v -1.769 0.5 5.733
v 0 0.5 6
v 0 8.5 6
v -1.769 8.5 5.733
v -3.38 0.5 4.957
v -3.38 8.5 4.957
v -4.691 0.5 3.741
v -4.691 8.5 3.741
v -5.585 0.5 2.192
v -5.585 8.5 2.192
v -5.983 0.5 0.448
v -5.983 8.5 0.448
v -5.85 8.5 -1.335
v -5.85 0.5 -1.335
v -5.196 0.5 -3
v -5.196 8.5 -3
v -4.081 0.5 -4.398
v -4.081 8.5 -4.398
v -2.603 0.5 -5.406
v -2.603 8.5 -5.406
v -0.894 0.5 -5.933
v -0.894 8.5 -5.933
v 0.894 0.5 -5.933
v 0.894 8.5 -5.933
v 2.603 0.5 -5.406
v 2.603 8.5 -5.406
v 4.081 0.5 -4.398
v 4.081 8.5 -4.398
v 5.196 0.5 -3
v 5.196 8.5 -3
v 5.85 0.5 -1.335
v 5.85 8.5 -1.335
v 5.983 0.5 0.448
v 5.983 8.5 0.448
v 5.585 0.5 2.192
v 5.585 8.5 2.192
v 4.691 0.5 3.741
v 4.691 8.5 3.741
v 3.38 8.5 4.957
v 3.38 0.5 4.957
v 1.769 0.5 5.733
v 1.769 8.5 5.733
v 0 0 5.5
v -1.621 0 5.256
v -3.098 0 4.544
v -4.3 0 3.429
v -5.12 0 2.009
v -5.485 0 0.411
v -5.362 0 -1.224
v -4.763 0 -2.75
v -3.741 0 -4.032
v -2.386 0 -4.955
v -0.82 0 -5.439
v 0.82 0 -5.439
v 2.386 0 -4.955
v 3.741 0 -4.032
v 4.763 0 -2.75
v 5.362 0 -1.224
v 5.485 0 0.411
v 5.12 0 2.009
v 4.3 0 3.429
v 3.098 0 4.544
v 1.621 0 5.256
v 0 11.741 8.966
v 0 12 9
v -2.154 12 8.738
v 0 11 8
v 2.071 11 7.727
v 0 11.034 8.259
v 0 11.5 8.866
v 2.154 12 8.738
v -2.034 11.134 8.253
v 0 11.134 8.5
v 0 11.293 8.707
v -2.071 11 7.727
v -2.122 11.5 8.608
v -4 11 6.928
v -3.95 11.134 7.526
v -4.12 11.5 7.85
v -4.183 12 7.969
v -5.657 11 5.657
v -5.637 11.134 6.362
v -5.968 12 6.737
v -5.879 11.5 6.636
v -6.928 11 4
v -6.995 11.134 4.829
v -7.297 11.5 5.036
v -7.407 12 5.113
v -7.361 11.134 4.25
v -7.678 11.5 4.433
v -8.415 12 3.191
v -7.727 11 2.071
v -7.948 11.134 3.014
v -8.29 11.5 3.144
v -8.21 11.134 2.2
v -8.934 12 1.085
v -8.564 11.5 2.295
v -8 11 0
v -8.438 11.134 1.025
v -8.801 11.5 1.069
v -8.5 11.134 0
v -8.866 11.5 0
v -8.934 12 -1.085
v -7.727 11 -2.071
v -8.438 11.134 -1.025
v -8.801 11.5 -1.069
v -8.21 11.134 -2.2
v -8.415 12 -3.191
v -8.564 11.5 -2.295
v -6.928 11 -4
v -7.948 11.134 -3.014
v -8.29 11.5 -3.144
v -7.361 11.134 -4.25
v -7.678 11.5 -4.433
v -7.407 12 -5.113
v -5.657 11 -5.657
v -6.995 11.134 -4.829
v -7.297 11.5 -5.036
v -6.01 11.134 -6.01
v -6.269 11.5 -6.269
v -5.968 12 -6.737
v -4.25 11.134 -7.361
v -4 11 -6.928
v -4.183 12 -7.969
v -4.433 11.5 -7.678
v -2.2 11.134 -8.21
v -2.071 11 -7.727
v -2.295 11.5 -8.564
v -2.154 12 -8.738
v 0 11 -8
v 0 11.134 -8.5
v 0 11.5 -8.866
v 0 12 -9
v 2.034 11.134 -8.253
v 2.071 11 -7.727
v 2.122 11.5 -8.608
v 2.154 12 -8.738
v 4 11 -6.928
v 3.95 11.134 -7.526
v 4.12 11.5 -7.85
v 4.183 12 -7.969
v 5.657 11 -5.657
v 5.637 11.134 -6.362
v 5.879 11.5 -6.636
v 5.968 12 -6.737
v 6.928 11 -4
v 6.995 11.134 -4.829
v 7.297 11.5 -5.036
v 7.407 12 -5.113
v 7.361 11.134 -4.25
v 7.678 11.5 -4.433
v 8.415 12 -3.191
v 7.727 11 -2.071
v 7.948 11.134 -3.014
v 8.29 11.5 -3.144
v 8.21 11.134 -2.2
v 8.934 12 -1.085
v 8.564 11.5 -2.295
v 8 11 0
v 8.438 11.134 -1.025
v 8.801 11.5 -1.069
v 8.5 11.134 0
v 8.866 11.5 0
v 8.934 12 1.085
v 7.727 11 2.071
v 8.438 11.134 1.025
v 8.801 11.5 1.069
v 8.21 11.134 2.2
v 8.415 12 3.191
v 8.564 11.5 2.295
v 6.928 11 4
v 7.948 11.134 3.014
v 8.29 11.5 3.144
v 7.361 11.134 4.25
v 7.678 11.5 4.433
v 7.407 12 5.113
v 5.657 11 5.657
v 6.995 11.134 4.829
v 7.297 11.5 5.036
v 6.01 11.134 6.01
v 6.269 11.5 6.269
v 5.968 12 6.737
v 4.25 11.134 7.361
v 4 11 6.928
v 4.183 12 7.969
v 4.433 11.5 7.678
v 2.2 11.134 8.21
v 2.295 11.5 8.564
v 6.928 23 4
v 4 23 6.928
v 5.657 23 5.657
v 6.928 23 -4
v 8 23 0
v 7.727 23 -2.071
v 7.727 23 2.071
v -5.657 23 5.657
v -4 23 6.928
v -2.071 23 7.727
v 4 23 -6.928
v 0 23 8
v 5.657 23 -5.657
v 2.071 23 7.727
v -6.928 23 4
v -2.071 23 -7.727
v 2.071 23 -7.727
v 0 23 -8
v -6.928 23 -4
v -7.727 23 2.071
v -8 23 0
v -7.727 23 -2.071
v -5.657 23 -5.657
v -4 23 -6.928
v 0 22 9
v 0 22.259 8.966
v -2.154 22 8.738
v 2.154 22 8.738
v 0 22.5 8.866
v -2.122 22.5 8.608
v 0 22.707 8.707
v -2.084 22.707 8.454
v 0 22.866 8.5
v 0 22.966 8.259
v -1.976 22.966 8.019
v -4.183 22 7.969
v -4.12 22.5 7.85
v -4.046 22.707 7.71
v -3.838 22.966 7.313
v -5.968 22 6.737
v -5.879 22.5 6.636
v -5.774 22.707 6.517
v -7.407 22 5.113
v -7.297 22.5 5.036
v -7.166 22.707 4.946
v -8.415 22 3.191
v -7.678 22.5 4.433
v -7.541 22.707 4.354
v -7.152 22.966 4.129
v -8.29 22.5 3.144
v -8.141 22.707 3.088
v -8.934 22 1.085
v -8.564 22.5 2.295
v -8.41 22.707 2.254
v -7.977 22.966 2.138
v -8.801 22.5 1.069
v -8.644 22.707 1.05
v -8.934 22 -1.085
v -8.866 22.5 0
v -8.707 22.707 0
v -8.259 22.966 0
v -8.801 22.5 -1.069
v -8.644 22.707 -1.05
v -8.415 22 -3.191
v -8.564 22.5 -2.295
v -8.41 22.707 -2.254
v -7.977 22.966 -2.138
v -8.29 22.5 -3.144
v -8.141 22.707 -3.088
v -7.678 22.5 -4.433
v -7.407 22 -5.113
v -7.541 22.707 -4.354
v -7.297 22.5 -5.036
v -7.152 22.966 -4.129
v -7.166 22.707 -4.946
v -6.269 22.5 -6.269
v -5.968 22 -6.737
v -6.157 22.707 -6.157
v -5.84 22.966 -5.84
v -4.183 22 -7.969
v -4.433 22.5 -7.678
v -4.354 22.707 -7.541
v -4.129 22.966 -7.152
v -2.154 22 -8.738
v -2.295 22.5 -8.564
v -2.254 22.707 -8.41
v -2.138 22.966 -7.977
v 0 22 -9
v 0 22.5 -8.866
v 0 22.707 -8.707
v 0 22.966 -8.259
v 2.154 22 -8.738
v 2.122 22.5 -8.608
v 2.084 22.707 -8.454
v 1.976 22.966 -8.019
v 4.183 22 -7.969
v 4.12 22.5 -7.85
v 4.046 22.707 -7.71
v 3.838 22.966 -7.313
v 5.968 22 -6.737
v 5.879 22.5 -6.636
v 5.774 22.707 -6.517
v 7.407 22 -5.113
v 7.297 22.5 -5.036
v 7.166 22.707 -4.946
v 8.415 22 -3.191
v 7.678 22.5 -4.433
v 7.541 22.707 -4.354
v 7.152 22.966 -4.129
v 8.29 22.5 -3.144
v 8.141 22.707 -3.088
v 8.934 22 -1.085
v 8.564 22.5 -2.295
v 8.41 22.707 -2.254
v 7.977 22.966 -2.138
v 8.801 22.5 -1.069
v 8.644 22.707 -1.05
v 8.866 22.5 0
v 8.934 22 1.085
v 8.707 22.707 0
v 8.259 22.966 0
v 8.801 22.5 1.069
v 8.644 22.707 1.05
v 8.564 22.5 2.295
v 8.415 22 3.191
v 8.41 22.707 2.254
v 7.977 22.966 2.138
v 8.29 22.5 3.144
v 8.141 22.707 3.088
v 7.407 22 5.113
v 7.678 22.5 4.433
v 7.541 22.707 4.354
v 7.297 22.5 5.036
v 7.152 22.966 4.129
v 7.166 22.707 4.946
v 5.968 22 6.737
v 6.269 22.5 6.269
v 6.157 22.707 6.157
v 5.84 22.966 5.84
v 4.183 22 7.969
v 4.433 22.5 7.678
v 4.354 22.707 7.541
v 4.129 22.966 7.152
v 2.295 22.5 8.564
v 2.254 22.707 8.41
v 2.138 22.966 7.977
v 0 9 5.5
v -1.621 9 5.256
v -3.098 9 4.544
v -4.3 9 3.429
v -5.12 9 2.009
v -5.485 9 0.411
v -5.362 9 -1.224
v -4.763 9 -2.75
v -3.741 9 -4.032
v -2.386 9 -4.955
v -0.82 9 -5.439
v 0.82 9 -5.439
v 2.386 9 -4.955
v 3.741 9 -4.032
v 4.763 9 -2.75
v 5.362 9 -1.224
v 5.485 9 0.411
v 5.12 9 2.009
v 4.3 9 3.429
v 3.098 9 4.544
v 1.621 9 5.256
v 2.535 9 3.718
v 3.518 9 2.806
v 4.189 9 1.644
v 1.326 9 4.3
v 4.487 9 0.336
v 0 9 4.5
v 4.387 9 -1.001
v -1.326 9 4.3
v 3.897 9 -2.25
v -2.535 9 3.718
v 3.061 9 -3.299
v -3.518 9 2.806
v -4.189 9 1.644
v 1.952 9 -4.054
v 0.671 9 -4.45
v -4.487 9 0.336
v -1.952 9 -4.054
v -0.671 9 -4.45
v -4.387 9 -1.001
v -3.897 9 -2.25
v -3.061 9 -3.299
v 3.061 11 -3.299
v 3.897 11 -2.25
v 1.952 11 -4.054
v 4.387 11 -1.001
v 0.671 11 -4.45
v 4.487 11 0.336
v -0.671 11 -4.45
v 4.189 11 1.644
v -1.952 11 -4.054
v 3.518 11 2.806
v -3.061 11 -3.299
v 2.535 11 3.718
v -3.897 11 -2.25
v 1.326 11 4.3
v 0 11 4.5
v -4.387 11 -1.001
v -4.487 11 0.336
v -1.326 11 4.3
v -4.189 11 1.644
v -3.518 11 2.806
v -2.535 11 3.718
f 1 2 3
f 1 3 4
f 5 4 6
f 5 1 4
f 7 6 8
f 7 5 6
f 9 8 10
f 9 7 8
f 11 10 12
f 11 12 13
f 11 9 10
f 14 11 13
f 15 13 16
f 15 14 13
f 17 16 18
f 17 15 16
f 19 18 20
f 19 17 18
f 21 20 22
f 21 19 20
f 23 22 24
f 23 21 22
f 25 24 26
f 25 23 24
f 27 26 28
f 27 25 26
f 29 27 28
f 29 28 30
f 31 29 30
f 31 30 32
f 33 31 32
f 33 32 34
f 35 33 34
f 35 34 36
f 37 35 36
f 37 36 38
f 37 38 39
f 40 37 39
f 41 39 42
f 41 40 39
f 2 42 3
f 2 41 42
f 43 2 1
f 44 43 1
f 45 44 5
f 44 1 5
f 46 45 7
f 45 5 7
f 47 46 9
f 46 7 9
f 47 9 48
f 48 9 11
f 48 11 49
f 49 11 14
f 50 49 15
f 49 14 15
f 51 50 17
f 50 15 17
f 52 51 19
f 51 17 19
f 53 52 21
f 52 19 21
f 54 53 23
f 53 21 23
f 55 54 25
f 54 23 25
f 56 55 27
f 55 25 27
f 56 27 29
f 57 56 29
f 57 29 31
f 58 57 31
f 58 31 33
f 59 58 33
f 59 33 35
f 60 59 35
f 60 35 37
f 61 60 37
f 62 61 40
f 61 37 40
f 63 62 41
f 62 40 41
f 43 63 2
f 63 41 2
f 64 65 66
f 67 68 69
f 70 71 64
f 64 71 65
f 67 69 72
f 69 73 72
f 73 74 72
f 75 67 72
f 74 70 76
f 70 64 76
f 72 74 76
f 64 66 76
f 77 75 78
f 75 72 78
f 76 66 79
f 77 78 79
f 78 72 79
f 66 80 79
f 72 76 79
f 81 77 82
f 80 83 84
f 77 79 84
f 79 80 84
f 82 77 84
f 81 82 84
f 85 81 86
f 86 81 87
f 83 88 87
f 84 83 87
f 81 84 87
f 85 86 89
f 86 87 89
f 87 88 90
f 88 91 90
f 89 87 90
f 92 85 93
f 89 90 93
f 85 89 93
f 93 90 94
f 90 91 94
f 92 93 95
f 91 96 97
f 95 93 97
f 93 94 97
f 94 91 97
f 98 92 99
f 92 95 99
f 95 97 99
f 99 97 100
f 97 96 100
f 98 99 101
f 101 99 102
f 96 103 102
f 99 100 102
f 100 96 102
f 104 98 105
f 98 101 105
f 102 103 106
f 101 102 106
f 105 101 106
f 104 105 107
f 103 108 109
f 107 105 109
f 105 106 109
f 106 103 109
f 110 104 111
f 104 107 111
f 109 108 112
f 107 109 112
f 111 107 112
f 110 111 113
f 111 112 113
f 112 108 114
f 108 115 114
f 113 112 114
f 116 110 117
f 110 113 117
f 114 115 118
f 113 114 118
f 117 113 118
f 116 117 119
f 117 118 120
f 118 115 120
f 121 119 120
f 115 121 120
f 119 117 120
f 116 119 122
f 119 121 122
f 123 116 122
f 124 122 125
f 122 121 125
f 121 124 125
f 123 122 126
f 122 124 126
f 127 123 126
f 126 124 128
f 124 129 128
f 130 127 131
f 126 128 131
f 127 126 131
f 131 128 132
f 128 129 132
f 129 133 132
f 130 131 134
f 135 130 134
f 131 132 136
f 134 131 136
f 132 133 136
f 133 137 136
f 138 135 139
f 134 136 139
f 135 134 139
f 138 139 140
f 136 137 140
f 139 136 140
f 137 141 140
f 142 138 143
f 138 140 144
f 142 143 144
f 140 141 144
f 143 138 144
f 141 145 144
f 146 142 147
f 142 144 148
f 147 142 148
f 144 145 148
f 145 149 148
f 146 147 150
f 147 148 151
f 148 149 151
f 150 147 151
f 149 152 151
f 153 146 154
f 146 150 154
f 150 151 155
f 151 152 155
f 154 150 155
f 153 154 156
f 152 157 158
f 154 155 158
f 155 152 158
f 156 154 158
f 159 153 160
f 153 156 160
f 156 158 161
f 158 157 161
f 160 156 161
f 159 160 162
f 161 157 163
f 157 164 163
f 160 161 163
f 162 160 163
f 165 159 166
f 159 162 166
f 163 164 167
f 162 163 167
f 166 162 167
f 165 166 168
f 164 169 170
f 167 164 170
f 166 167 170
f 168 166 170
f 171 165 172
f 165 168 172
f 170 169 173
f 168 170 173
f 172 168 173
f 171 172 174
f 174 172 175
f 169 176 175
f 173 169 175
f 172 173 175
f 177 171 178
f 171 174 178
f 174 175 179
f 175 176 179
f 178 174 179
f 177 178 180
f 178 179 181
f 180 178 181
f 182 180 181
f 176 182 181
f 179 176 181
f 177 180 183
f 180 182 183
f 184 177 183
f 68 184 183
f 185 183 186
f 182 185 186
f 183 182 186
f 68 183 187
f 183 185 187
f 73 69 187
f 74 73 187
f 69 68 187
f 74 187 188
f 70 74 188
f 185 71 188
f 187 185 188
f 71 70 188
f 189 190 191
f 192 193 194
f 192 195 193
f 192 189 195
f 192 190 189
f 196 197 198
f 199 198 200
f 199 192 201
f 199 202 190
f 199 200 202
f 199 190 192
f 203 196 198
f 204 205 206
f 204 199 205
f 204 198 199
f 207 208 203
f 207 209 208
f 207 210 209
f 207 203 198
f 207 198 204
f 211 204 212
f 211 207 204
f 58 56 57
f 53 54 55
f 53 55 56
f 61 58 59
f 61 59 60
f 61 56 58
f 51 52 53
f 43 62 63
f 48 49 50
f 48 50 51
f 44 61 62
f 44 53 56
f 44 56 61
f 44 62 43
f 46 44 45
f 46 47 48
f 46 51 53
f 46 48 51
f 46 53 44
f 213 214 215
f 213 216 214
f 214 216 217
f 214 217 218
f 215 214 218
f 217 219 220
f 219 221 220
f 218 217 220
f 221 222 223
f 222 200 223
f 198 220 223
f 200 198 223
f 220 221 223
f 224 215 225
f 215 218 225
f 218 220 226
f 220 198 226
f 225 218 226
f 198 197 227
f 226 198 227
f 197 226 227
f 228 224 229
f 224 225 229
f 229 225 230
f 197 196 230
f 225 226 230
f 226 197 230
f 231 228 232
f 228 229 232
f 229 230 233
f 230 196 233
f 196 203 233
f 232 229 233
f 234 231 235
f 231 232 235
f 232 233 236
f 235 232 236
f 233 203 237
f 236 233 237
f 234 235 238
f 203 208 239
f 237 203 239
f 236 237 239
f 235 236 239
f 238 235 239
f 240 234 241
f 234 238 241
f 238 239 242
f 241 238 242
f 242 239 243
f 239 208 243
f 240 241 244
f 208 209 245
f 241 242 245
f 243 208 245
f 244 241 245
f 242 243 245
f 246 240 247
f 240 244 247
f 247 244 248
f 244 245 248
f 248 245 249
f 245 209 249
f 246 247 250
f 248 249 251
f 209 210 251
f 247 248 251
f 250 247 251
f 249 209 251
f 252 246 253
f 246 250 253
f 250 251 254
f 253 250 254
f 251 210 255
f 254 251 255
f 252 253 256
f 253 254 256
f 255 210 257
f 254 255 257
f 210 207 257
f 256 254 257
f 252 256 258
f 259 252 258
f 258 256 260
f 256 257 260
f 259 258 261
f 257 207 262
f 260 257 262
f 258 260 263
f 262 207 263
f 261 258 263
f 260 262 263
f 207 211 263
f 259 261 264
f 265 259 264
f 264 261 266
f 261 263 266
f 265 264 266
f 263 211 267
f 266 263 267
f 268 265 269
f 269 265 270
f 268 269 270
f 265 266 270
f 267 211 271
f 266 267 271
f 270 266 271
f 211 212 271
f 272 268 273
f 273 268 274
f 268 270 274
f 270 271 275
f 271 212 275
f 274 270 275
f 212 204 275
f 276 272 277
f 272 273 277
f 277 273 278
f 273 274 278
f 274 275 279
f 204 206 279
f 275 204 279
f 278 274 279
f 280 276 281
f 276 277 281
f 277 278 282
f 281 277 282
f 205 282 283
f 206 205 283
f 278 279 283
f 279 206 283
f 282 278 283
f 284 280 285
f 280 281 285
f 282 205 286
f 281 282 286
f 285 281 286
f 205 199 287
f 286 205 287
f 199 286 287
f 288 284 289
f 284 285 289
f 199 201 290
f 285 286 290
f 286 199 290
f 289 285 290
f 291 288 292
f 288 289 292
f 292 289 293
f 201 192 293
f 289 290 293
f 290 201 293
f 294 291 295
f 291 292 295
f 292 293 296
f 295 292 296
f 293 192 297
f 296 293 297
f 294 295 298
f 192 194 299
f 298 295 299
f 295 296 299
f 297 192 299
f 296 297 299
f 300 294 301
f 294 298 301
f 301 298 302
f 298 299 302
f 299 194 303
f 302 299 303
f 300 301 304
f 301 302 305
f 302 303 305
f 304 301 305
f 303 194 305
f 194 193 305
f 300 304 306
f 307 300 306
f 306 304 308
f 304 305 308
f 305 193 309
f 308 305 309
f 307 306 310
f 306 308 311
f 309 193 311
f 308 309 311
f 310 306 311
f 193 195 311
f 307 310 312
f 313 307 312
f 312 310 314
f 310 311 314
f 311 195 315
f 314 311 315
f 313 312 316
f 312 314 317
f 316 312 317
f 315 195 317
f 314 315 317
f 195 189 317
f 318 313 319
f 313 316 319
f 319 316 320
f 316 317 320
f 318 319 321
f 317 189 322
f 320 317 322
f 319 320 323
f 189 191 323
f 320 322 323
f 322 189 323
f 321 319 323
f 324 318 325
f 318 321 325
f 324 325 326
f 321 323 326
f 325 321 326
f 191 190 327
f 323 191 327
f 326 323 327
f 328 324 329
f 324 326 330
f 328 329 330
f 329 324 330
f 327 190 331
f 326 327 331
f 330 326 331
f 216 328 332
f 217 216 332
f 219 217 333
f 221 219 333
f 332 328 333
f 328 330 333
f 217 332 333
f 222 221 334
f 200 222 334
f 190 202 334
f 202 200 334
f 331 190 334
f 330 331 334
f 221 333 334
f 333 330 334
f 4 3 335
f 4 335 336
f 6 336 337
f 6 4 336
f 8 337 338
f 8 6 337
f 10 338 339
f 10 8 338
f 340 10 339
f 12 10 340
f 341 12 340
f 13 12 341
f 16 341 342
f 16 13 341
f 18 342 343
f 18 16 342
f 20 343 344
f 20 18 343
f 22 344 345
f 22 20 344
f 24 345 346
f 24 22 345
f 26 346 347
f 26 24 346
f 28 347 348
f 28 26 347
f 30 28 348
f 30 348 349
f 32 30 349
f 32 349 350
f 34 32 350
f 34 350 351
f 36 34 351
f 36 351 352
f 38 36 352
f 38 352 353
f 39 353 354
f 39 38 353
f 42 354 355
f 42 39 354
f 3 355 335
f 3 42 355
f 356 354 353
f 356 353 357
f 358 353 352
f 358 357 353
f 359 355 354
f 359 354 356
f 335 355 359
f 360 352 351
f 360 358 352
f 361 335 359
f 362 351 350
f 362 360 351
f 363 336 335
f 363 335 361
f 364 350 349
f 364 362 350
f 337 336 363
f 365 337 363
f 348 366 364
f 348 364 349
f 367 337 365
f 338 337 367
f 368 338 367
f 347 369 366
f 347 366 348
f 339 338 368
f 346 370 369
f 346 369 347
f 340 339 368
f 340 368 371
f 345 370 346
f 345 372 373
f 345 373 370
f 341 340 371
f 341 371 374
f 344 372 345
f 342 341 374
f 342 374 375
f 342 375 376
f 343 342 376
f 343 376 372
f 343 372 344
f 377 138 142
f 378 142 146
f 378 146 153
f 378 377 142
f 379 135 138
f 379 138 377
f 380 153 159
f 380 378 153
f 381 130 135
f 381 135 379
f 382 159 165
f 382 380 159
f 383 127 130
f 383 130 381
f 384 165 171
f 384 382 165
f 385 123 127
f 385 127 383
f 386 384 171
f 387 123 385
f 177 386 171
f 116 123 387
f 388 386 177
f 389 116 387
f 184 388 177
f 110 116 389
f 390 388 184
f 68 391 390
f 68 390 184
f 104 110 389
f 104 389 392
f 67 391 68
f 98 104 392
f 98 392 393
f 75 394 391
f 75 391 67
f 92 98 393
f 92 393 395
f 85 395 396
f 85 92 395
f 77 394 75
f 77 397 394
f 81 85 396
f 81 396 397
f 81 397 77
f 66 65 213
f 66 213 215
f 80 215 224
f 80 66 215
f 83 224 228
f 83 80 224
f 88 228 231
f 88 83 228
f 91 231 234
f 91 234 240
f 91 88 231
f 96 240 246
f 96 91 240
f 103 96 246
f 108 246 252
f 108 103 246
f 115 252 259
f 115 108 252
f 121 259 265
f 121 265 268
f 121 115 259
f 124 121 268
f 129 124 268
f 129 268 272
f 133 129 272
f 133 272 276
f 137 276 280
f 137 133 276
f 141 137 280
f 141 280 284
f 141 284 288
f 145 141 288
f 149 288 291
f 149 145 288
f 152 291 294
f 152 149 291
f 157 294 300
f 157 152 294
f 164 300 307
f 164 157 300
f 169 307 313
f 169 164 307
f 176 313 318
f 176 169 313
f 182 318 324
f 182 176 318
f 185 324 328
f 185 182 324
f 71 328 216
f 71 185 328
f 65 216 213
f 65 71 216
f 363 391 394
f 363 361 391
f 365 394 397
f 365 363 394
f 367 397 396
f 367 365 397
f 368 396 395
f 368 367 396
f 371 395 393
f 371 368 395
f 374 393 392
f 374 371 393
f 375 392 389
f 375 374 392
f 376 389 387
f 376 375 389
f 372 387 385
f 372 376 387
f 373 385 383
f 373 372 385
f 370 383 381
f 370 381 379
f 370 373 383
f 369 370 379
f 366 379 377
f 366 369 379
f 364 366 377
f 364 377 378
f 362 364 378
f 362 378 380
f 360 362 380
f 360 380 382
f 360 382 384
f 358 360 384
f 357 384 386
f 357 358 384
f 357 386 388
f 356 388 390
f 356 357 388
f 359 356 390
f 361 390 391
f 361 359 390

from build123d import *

# Parameters (mm, degrees)
F2_SIZE = 0.5
F3_R    = 1


with BuildPart() as f1:
    # F0 (on Right) → F1 (revolve)
    with BuildSketch(Plane.YZ):
        Polygon((0, 6), (0, 0), (23, 0), (23, 9), (11, 9), (11, 4.5), (9, 4.5), (9, 6), align=None)
    revolve(axis=Axis((0, 11.5, 0), (0, -1, 0)))

    # F2
    f2_edges = [f1.edges().sort_by_distance(p)[0] for p in [
        (0, 0, -6),
        (0, 9, -6),
    ]]
    chamfer(f2_edges, length=F2_SIZE)

    # F3
    f3_edges = [f1.edges().sort_by_distance(p)[0] for p in [
        (0, 11, -9),
        (0, 23, -9),
    ]]
    fillet(f3_edges, radius=F3_R)


solid = f1.part
